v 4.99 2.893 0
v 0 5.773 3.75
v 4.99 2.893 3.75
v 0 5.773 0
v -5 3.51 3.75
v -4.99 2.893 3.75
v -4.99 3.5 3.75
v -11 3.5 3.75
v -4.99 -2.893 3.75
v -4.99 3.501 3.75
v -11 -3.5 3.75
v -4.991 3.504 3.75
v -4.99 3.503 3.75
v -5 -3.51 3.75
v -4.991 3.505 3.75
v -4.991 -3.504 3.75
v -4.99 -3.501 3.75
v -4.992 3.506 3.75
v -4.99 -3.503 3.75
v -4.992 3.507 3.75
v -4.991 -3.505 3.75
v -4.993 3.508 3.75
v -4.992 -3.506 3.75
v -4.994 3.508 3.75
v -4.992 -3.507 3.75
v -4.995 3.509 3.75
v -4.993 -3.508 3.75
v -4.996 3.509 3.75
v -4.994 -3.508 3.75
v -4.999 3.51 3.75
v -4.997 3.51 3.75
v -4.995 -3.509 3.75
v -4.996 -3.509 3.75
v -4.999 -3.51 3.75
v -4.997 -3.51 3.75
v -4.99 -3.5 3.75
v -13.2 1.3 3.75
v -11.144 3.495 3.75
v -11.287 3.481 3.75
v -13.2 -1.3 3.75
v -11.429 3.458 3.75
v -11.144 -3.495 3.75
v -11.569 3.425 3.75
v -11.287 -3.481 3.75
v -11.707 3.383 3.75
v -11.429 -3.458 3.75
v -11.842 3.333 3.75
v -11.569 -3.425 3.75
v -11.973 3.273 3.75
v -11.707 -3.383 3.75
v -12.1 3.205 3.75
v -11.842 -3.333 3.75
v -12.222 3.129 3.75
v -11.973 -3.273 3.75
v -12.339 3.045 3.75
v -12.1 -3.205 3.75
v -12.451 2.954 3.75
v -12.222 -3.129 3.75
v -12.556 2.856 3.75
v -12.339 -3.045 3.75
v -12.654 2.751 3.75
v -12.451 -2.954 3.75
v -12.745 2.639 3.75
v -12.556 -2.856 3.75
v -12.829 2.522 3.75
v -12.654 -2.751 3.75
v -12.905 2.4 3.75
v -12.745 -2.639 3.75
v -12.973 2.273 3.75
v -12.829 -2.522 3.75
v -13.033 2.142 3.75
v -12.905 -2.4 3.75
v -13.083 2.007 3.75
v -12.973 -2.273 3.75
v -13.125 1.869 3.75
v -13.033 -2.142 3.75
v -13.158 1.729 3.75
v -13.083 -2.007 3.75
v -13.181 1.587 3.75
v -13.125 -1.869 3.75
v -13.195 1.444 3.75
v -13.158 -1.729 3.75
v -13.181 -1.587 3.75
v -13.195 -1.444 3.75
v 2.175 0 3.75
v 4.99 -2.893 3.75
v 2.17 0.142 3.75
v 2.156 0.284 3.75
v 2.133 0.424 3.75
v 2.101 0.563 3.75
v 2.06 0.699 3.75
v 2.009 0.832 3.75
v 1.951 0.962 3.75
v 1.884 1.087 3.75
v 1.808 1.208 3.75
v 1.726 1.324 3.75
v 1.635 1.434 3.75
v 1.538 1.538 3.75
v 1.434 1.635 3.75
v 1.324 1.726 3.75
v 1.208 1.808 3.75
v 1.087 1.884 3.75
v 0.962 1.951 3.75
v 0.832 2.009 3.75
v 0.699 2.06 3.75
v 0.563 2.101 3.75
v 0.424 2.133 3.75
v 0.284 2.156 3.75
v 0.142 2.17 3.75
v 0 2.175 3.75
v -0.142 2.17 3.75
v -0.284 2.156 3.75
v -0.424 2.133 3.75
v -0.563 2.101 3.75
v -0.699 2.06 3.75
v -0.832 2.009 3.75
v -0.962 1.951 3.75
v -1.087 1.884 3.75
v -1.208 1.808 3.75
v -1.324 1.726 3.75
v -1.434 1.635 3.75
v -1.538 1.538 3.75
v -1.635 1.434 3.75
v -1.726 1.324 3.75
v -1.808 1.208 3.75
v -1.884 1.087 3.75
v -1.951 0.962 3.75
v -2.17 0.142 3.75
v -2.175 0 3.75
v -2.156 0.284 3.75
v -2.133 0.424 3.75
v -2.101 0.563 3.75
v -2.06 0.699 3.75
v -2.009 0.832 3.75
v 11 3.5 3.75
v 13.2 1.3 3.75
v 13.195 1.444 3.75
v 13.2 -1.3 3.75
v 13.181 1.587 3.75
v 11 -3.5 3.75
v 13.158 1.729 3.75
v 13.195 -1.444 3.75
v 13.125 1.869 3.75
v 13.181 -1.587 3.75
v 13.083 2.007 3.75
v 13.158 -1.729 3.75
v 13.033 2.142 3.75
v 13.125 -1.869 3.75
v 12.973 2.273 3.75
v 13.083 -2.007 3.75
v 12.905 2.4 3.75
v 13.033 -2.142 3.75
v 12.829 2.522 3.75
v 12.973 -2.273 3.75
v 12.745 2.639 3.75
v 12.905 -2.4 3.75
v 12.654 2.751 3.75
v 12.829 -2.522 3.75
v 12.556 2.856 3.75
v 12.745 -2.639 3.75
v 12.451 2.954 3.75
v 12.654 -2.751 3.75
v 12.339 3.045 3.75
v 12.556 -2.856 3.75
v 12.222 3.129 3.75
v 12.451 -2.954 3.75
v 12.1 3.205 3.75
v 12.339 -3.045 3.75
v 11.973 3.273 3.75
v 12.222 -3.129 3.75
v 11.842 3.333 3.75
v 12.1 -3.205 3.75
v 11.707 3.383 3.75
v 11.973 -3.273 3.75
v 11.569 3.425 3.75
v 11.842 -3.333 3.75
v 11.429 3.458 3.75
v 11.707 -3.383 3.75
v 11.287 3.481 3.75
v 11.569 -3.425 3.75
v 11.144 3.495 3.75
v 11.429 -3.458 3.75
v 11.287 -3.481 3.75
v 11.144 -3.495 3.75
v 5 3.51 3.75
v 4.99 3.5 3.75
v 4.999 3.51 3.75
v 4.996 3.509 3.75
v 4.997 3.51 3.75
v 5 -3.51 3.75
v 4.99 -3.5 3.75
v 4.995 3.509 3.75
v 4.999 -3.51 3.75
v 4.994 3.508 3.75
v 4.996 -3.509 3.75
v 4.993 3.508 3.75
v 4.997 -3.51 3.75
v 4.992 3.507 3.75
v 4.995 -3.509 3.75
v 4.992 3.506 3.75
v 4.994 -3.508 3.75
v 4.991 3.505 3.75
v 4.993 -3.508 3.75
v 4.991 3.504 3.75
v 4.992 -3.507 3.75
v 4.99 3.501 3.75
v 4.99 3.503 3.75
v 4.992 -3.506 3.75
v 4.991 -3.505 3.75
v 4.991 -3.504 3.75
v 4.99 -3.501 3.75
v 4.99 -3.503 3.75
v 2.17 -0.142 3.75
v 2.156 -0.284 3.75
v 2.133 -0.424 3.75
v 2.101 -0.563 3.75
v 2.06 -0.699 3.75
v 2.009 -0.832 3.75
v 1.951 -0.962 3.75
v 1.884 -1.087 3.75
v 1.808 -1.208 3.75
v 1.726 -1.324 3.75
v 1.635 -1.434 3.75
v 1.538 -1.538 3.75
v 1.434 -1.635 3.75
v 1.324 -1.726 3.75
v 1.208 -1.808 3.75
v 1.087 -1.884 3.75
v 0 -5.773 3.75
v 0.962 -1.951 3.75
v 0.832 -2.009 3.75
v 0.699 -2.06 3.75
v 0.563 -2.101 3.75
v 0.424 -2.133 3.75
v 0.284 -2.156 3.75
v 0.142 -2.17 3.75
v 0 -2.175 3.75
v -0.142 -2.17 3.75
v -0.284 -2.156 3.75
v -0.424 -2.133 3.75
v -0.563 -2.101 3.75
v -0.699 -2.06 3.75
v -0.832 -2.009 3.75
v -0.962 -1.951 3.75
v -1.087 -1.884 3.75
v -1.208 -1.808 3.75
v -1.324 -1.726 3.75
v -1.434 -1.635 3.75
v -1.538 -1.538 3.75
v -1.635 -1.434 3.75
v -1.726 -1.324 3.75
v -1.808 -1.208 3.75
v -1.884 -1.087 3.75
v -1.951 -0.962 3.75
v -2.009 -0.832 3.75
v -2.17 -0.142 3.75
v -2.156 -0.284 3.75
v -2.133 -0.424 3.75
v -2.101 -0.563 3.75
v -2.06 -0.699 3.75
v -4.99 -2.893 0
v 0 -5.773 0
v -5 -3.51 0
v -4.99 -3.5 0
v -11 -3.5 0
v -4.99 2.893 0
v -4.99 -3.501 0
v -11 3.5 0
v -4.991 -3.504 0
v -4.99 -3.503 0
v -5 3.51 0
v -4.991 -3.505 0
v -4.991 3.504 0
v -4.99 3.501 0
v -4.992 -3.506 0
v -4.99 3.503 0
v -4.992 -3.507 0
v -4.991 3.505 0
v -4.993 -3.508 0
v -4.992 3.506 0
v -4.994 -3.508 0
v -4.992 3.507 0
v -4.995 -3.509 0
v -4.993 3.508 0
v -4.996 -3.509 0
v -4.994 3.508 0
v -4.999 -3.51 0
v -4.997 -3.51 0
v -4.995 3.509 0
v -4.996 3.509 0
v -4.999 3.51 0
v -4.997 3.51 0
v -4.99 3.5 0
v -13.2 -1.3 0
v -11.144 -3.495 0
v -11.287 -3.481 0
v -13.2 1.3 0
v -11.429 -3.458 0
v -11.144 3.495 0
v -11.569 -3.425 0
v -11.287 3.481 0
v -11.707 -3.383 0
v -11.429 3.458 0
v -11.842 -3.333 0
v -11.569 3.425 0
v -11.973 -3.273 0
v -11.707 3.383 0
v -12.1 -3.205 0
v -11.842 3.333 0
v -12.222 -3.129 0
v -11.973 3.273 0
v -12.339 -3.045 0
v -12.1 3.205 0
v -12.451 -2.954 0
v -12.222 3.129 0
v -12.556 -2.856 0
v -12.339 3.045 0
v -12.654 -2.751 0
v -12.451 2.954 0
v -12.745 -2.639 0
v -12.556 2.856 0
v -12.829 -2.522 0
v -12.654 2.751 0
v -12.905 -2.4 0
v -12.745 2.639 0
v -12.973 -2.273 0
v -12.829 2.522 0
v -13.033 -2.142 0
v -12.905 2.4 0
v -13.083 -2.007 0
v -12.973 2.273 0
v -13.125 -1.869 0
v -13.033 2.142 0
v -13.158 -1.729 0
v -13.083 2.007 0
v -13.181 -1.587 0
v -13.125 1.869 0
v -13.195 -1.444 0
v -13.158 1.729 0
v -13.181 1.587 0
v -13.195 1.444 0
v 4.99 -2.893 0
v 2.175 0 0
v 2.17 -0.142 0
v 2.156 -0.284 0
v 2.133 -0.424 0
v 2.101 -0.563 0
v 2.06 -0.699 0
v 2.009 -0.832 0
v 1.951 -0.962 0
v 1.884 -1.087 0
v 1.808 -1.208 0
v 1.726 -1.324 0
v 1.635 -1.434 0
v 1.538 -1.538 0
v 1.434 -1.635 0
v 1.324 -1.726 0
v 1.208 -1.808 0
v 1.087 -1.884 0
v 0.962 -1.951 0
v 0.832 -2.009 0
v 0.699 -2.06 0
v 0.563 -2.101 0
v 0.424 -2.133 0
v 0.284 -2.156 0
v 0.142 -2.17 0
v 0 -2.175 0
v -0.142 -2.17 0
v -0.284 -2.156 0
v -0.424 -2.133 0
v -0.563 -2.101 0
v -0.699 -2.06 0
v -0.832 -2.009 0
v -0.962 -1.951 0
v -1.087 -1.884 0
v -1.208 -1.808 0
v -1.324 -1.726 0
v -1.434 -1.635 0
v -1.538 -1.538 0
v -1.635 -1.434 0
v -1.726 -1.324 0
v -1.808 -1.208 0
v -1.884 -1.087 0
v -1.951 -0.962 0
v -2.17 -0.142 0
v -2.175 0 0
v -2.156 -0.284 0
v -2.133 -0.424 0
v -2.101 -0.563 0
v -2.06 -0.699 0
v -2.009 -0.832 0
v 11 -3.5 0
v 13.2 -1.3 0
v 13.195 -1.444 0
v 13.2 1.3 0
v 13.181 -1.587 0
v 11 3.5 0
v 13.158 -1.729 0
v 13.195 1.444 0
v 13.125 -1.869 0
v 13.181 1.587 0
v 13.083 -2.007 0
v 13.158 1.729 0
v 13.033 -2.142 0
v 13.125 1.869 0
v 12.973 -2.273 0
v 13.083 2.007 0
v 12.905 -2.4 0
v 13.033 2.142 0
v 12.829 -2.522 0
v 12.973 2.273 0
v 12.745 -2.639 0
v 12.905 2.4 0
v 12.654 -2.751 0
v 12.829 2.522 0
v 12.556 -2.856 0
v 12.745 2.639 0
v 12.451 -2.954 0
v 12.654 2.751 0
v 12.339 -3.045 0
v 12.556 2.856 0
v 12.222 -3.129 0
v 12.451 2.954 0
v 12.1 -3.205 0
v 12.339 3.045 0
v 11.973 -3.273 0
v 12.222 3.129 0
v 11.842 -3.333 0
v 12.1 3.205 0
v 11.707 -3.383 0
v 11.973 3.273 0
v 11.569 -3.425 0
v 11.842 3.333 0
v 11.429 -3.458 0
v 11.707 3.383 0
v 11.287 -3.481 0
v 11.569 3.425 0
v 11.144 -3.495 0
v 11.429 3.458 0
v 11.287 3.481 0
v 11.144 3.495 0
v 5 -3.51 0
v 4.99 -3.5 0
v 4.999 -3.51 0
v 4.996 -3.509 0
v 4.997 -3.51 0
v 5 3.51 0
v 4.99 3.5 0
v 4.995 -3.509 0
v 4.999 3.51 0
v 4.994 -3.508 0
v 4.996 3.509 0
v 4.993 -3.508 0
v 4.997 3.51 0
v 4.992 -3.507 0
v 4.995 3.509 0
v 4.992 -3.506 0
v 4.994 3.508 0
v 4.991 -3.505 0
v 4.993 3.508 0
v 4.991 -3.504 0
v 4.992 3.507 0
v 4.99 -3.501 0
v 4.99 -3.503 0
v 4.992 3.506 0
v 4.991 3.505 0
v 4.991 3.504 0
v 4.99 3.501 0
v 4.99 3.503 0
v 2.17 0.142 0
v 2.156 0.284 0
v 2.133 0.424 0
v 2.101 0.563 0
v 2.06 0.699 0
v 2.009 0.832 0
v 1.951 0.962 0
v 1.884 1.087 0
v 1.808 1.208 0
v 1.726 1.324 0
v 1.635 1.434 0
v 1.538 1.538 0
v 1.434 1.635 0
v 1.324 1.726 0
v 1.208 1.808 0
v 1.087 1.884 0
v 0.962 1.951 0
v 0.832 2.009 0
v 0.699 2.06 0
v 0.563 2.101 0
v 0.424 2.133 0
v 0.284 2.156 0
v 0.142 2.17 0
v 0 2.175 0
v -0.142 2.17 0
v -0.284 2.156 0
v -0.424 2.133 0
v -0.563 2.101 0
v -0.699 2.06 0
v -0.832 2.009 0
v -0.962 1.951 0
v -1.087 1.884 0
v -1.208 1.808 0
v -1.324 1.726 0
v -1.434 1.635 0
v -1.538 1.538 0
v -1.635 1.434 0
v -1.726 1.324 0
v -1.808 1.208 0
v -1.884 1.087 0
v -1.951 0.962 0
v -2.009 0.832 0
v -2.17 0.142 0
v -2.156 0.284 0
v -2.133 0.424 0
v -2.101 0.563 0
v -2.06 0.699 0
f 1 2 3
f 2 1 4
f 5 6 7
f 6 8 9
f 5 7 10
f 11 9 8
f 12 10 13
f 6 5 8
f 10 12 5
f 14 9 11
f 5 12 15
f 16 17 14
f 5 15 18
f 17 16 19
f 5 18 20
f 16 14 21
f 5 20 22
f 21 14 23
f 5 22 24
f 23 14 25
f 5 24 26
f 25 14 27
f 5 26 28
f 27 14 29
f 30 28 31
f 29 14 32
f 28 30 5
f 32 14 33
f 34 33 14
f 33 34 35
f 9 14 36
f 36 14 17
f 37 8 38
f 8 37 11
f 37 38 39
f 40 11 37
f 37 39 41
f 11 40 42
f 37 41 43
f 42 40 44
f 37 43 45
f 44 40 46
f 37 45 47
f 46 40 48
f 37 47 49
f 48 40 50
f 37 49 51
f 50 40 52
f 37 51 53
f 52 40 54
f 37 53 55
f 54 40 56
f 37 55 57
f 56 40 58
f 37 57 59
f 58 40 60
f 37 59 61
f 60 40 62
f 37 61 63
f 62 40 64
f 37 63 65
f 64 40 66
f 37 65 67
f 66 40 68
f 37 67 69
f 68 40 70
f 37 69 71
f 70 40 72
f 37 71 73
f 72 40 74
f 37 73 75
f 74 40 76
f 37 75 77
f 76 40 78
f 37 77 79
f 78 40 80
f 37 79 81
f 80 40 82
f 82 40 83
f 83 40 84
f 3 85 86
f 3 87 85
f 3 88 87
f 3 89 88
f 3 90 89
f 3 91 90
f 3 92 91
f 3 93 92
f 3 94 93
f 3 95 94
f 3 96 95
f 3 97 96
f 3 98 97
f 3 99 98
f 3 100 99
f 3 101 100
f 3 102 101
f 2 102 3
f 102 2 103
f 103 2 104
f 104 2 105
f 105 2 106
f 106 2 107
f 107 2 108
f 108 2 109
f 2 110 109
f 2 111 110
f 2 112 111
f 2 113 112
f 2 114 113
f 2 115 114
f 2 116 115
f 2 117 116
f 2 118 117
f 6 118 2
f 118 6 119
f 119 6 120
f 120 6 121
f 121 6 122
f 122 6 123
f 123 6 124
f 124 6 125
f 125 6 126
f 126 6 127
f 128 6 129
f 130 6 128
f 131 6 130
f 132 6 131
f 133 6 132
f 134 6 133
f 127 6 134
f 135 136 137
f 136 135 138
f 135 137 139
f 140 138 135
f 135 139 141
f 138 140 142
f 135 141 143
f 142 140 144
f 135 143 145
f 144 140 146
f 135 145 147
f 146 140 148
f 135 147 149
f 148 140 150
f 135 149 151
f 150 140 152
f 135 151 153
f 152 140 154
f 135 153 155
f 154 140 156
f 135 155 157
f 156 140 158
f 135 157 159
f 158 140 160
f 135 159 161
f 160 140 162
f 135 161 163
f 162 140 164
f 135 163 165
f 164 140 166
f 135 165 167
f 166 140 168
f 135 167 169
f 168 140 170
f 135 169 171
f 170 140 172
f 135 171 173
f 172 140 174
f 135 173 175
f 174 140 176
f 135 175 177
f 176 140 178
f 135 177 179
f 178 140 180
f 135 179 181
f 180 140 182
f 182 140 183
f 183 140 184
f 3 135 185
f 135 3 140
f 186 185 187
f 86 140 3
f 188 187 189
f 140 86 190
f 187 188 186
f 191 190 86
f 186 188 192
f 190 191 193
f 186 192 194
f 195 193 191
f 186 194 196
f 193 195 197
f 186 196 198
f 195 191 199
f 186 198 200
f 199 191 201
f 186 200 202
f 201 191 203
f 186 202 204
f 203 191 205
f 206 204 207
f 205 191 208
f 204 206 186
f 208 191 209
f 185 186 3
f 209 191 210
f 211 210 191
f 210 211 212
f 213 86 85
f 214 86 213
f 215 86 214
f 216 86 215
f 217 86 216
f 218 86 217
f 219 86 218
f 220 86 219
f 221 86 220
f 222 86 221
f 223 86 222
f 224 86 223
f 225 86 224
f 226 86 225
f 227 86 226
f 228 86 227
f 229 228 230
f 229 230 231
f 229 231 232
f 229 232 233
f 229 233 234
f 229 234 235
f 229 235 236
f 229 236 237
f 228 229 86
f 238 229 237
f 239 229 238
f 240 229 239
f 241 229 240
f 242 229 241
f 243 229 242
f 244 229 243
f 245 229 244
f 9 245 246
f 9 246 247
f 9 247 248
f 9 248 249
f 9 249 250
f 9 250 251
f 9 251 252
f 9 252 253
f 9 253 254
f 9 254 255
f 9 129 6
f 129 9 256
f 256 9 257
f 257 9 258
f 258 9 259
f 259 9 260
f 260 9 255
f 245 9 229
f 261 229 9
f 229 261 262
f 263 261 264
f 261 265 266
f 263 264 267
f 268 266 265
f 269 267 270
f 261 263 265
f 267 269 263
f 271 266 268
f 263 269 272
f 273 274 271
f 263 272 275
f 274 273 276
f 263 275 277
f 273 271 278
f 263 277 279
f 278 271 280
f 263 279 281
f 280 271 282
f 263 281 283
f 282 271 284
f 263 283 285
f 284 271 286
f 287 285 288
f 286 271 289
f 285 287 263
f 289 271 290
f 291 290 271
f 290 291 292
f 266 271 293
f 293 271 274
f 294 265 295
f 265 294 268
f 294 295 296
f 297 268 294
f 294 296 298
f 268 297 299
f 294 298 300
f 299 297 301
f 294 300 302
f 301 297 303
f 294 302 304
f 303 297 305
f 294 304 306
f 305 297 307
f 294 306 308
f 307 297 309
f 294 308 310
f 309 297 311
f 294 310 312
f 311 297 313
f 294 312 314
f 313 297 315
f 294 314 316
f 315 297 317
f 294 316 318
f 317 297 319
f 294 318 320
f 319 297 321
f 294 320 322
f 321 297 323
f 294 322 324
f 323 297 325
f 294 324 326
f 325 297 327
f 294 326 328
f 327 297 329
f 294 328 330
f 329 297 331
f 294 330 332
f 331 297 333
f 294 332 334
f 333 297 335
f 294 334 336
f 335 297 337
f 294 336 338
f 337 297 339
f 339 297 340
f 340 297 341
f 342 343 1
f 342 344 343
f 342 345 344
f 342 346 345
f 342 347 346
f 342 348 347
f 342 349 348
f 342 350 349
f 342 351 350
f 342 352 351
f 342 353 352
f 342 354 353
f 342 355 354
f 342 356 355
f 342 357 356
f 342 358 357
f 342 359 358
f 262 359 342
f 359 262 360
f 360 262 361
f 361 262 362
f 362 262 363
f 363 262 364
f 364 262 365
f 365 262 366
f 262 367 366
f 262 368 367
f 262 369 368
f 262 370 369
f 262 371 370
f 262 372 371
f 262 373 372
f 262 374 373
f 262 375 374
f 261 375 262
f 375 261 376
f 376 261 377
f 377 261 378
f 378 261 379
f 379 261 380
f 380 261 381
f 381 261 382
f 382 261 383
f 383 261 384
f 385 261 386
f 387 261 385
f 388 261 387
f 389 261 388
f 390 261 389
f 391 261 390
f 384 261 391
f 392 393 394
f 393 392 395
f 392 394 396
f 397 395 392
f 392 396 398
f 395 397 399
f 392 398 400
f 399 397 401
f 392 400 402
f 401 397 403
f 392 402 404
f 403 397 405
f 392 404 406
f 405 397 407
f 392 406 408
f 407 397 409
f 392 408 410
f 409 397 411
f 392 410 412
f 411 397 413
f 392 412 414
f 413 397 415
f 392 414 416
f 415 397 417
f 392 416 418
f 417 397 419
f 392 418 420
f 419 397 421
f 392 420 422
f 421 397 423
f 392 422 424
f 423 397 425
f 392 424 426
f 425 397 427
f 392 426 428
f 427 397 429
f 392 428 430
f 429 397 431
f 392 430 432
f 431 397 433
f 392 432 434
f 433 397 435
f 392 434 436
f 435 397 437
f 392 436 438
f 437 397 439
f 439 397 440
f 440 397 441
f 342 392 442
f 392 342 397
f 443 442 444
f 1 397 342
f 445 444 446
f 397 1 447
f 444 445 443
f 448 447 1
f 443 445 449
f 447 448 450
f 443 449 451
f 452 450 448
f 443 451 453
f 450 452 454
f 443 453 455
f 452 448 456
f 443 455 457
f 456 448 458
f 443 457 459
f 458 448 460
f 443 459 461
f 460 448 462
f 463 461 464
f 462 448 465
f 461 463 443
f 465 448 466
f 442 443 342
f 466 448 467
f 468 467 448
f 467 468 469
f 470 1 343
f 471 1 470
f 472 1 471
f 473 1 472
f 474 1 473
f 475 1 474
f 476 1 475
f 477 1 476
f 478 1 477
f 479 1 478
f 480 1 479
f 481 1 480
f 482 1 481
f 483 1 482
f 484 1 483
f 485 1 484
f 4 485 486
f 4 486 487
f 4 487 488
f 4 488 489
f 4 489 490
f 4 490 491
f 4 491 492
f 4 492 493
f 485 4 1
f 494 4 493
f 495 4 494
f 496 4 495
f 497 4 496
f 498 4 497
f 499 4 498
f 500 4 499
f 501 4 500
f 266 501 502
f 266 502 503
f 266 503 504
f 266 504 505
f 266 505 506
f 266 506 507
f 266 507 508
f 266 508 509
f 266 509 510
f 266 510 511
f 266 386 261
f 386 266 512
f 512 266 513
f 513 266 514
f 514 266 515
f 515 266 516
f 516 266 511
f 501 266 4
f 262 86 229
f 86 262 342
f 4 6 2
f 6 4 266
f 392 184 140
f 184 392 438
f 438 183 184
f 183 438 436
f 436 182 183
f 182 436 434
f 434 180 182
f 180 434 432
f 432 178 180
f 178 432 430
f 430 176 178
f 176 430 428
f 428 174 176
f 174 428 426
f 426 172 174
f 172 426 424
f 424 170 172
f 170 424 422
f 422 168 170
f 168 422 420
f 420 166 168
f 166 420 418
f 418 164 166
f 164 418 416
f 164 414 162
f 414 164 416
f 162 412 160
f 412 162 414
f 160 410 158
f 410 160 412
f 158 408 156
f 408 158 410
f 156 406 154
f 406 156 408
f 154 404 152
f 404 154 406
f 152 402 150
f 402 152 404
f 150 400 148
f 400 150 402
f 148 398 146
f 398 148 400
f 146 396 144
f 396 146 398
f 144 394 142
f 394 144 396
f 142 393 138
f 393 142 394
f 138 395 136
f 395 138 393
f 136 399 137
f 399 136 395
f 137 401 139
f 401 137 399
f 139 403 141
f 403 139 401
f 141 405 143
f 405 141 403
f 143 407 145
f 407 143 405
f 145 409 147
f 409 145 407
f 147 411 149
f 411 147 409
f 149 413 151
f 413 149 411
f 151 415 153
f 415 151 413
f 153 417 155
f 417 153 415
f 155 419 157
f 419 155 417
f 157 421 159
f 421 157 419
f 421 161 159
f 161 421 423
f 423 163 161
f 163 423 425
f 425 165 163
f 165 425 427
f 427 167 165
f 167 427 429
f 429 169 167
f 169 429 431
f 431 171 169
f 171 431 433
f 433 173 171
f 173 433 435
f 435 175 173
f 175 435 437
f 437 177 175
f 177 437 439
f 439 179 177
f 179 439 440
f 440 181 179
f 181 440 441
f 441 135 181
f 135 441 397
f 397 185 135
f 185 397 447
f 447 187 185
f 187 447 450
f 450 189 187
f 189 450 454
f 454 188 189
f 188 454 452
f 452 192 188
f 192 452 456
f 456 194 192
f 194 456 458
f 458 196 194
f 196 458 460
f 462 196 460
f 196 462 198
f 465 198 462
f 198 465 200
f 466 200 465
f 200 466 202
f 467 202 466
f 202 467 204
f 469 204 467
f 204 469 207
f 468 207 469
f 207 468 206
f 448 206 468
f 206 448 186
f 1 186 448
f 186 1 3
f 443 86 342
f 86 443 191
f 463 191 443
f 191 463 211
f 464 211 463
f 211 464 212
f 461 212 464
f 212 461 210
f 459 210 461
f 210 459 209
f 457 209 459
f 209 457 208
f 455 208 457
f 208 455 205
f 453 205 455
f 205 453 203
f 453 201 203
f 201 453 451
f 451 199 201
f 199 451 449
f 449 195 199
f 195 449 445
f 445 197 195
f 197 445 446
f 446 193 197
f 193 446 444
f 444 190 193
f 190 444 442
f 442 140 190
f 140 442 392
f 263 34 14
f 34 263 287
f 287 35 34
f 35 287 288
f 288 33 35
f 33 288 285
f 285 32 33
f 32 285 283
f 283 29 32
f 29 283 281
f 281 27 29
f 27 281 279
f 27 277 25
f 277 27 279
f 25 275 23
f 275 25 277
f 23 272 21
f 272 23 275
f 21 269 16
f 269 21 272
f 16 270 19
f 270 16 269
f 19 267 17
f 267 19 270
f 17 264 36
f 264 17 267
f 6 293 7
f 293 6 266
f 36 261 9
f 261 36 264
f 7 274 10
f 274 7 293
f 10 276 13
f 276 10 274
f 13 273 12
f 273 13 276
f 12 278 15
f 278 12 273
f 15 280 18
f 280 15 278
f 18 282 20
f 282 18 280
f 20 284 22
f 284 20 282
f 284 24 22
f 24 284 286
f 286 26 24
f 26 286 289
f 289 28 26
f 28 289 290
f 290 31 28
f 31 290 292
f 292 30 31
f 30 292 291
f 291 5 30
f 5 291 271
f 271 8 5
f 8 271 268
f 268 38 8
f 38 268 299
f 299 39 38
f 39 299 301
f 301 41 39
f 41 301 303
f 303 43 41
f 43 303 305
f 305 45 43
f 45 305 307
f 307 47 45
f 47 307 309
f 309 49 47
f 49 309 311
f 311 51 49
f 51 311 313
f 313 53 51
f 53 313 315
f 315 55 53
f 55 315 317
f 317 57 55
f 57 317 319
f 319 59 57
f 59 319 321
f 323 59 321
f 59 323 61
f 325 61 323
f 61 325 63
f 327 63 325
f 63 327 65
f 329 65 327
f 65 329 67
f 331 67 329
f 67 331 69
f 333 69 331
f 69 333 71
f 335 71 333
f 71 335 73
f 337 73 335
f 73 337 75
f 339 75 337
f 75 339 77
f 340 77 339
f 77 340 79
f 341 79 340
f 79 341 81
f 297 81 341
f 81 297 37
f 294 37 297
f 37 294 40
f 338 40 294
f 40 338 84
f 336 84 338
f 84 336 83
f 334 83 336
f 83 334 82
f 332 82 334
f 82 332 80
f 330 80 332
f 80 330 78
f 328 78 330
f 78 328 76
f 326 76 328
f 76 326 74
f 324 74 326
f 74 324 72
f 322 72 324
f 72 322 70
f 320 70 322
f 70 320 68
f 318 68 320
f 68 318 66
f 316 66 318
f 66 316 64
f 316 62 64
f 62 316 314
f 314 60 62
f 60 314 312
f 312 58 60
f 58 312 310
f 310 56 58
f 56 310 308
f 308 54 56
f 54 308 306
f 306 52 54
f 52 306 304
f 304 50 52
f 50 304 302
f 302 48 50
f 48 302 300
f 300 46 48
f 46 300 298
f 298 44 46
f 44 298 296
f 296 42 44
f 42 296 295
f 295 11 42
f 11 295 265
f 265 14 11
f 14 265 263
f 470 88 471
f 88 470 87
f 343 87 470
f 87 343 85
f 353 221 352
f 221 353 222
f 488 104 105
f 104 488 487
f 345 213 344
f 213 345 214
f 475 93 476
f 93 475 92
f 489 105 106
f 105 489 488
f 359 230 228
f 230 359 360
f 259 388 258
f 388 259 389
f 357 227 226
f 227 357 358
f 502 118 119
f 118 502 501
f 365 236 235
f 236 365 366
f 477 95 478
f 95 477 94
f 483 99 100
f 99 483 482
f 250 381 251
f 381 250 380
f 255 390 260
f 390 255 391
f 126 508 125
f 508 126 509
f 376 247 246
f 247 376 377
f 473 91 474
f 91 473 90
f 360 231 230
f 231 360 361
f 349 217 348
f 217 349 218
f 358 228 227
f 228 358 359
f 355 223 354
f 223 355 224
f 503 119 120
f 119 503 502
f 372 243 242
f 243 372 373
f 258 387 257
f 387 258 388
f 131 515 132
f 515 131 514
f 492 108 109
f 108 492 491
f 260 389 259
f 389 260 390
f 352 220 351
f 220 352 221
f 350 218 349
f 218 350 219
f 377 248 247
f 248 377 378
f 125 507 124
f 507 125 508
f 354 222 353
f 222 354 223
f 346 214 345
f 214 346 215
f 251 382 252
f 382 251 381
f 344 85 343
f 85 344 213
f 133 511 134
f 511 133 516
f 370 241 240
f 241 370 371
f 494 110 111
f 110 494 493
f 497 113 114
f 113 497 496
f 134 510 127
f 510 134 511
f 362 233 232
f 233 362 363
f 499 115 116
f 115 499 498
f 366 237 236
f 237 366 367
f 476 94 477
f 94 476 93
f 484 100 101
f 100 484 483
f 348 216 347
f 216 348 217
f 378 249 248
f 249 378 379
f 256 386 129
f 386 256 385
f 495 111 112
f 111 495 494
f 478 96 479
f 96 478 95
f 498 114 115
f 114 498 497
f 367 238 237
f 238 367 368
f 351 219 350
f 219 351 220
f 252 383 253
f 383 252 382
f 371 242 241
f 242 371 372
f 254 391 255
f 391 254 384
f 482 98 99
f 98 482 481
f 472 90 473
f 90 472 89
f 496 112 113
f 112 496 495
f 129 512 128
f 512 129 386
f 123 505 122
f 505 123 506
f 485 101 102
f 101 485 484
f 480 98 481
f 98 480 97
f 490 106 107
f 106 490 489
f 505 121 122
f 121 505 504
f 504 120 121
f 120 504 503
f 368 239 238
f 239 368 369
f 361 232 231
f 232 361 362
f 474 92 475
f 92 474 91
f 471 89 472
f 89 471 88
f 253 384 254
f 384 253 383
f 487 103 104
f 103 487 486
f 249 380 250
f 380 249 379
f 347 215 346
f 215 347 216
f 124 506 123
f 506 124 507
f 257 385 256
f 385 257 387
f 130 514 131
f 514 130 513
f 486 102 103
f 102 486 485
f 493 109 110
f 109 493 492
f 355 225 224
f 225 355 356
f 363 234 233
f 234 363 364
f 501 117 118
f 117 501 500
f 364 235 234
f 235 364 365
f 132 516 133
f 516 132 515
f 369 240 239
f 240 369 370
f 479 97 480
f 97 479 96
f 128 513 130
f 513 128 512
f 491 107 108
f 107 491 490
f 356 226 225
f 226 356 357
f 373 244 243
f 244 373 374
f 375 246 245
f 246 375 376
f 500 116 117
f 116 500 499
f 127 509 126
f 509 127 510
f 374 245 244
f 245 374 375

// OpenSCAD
$fn = 96;

// Wing nut for M4 (4.0mm) screw
// Specs: 10.0mm across flats, 3.75mm thick

across_flats = 10.0;
thickness    = 3.75;

screw_d      = 4.0;
clearance    = 0.35;          // typical clearance for M4
hole_d       = screw_d + clearance;

nut_flat_to_corner = across_flats / cos(30); // circumscribed diameter for hex
hex_r = nut_flat_to_corner / 2;

wing_span = 22.0;             // overall width including wings
wing_len  = (wing_span - across_flats) / 2;
wing_w    = 7.0;              // wing width (Y direction)
wing_tip_r = 2.2;

module hex_prism(af, h){
    r = (af / cos(30)) / 2;
    linear_extrude(height=h)
        polygon([ for(i=[0:5]) [ r*cos(60*i+30), r*sin(60*i+30) ] ]);
}

module wing2d(len, w, tip_r){
    // Rounded rectangle-ish wing extending in +X from origin
    hull(){
        translate([0, 0]) circle(r=0.01);
        translate([len, 0]) circle(r=tip_r);
        translate([len,  w/2 - tip_r]) circle(r=tip_r);
        translate([len, -w/2 + tip_r]) circle(r=tip_r);
        translate([0,  w/2]) circle(r=0.01);
        translate([0, -w/2]) circle(r=0.01);
    }
}

module wingnut(){
    difference(){
        union(){
            // Main hex body
            hex_prism(across_flats, thickness);

            // Wings (two sides)
            linear_extrude(height=thickness)
                union(){
                    translate([across_flats/2, 0]) wing2d(wing_len, wing_w, wing_tip_r);
                    mirror([1,0,0]) translate([across_flats/2, 0]) wing2d(wing_len, wing_w, wing_tip_r);
                }

            // Slight top/bottom chamfer via minkowski-like bevel approximation
            // (kept subtle to preserve thickness)
        }

        // Through hole for screw
        translate([0,0,-0.2])
            cylinder(d=hole_d, h=thickness+0.4);
    }
}

wingnut();
